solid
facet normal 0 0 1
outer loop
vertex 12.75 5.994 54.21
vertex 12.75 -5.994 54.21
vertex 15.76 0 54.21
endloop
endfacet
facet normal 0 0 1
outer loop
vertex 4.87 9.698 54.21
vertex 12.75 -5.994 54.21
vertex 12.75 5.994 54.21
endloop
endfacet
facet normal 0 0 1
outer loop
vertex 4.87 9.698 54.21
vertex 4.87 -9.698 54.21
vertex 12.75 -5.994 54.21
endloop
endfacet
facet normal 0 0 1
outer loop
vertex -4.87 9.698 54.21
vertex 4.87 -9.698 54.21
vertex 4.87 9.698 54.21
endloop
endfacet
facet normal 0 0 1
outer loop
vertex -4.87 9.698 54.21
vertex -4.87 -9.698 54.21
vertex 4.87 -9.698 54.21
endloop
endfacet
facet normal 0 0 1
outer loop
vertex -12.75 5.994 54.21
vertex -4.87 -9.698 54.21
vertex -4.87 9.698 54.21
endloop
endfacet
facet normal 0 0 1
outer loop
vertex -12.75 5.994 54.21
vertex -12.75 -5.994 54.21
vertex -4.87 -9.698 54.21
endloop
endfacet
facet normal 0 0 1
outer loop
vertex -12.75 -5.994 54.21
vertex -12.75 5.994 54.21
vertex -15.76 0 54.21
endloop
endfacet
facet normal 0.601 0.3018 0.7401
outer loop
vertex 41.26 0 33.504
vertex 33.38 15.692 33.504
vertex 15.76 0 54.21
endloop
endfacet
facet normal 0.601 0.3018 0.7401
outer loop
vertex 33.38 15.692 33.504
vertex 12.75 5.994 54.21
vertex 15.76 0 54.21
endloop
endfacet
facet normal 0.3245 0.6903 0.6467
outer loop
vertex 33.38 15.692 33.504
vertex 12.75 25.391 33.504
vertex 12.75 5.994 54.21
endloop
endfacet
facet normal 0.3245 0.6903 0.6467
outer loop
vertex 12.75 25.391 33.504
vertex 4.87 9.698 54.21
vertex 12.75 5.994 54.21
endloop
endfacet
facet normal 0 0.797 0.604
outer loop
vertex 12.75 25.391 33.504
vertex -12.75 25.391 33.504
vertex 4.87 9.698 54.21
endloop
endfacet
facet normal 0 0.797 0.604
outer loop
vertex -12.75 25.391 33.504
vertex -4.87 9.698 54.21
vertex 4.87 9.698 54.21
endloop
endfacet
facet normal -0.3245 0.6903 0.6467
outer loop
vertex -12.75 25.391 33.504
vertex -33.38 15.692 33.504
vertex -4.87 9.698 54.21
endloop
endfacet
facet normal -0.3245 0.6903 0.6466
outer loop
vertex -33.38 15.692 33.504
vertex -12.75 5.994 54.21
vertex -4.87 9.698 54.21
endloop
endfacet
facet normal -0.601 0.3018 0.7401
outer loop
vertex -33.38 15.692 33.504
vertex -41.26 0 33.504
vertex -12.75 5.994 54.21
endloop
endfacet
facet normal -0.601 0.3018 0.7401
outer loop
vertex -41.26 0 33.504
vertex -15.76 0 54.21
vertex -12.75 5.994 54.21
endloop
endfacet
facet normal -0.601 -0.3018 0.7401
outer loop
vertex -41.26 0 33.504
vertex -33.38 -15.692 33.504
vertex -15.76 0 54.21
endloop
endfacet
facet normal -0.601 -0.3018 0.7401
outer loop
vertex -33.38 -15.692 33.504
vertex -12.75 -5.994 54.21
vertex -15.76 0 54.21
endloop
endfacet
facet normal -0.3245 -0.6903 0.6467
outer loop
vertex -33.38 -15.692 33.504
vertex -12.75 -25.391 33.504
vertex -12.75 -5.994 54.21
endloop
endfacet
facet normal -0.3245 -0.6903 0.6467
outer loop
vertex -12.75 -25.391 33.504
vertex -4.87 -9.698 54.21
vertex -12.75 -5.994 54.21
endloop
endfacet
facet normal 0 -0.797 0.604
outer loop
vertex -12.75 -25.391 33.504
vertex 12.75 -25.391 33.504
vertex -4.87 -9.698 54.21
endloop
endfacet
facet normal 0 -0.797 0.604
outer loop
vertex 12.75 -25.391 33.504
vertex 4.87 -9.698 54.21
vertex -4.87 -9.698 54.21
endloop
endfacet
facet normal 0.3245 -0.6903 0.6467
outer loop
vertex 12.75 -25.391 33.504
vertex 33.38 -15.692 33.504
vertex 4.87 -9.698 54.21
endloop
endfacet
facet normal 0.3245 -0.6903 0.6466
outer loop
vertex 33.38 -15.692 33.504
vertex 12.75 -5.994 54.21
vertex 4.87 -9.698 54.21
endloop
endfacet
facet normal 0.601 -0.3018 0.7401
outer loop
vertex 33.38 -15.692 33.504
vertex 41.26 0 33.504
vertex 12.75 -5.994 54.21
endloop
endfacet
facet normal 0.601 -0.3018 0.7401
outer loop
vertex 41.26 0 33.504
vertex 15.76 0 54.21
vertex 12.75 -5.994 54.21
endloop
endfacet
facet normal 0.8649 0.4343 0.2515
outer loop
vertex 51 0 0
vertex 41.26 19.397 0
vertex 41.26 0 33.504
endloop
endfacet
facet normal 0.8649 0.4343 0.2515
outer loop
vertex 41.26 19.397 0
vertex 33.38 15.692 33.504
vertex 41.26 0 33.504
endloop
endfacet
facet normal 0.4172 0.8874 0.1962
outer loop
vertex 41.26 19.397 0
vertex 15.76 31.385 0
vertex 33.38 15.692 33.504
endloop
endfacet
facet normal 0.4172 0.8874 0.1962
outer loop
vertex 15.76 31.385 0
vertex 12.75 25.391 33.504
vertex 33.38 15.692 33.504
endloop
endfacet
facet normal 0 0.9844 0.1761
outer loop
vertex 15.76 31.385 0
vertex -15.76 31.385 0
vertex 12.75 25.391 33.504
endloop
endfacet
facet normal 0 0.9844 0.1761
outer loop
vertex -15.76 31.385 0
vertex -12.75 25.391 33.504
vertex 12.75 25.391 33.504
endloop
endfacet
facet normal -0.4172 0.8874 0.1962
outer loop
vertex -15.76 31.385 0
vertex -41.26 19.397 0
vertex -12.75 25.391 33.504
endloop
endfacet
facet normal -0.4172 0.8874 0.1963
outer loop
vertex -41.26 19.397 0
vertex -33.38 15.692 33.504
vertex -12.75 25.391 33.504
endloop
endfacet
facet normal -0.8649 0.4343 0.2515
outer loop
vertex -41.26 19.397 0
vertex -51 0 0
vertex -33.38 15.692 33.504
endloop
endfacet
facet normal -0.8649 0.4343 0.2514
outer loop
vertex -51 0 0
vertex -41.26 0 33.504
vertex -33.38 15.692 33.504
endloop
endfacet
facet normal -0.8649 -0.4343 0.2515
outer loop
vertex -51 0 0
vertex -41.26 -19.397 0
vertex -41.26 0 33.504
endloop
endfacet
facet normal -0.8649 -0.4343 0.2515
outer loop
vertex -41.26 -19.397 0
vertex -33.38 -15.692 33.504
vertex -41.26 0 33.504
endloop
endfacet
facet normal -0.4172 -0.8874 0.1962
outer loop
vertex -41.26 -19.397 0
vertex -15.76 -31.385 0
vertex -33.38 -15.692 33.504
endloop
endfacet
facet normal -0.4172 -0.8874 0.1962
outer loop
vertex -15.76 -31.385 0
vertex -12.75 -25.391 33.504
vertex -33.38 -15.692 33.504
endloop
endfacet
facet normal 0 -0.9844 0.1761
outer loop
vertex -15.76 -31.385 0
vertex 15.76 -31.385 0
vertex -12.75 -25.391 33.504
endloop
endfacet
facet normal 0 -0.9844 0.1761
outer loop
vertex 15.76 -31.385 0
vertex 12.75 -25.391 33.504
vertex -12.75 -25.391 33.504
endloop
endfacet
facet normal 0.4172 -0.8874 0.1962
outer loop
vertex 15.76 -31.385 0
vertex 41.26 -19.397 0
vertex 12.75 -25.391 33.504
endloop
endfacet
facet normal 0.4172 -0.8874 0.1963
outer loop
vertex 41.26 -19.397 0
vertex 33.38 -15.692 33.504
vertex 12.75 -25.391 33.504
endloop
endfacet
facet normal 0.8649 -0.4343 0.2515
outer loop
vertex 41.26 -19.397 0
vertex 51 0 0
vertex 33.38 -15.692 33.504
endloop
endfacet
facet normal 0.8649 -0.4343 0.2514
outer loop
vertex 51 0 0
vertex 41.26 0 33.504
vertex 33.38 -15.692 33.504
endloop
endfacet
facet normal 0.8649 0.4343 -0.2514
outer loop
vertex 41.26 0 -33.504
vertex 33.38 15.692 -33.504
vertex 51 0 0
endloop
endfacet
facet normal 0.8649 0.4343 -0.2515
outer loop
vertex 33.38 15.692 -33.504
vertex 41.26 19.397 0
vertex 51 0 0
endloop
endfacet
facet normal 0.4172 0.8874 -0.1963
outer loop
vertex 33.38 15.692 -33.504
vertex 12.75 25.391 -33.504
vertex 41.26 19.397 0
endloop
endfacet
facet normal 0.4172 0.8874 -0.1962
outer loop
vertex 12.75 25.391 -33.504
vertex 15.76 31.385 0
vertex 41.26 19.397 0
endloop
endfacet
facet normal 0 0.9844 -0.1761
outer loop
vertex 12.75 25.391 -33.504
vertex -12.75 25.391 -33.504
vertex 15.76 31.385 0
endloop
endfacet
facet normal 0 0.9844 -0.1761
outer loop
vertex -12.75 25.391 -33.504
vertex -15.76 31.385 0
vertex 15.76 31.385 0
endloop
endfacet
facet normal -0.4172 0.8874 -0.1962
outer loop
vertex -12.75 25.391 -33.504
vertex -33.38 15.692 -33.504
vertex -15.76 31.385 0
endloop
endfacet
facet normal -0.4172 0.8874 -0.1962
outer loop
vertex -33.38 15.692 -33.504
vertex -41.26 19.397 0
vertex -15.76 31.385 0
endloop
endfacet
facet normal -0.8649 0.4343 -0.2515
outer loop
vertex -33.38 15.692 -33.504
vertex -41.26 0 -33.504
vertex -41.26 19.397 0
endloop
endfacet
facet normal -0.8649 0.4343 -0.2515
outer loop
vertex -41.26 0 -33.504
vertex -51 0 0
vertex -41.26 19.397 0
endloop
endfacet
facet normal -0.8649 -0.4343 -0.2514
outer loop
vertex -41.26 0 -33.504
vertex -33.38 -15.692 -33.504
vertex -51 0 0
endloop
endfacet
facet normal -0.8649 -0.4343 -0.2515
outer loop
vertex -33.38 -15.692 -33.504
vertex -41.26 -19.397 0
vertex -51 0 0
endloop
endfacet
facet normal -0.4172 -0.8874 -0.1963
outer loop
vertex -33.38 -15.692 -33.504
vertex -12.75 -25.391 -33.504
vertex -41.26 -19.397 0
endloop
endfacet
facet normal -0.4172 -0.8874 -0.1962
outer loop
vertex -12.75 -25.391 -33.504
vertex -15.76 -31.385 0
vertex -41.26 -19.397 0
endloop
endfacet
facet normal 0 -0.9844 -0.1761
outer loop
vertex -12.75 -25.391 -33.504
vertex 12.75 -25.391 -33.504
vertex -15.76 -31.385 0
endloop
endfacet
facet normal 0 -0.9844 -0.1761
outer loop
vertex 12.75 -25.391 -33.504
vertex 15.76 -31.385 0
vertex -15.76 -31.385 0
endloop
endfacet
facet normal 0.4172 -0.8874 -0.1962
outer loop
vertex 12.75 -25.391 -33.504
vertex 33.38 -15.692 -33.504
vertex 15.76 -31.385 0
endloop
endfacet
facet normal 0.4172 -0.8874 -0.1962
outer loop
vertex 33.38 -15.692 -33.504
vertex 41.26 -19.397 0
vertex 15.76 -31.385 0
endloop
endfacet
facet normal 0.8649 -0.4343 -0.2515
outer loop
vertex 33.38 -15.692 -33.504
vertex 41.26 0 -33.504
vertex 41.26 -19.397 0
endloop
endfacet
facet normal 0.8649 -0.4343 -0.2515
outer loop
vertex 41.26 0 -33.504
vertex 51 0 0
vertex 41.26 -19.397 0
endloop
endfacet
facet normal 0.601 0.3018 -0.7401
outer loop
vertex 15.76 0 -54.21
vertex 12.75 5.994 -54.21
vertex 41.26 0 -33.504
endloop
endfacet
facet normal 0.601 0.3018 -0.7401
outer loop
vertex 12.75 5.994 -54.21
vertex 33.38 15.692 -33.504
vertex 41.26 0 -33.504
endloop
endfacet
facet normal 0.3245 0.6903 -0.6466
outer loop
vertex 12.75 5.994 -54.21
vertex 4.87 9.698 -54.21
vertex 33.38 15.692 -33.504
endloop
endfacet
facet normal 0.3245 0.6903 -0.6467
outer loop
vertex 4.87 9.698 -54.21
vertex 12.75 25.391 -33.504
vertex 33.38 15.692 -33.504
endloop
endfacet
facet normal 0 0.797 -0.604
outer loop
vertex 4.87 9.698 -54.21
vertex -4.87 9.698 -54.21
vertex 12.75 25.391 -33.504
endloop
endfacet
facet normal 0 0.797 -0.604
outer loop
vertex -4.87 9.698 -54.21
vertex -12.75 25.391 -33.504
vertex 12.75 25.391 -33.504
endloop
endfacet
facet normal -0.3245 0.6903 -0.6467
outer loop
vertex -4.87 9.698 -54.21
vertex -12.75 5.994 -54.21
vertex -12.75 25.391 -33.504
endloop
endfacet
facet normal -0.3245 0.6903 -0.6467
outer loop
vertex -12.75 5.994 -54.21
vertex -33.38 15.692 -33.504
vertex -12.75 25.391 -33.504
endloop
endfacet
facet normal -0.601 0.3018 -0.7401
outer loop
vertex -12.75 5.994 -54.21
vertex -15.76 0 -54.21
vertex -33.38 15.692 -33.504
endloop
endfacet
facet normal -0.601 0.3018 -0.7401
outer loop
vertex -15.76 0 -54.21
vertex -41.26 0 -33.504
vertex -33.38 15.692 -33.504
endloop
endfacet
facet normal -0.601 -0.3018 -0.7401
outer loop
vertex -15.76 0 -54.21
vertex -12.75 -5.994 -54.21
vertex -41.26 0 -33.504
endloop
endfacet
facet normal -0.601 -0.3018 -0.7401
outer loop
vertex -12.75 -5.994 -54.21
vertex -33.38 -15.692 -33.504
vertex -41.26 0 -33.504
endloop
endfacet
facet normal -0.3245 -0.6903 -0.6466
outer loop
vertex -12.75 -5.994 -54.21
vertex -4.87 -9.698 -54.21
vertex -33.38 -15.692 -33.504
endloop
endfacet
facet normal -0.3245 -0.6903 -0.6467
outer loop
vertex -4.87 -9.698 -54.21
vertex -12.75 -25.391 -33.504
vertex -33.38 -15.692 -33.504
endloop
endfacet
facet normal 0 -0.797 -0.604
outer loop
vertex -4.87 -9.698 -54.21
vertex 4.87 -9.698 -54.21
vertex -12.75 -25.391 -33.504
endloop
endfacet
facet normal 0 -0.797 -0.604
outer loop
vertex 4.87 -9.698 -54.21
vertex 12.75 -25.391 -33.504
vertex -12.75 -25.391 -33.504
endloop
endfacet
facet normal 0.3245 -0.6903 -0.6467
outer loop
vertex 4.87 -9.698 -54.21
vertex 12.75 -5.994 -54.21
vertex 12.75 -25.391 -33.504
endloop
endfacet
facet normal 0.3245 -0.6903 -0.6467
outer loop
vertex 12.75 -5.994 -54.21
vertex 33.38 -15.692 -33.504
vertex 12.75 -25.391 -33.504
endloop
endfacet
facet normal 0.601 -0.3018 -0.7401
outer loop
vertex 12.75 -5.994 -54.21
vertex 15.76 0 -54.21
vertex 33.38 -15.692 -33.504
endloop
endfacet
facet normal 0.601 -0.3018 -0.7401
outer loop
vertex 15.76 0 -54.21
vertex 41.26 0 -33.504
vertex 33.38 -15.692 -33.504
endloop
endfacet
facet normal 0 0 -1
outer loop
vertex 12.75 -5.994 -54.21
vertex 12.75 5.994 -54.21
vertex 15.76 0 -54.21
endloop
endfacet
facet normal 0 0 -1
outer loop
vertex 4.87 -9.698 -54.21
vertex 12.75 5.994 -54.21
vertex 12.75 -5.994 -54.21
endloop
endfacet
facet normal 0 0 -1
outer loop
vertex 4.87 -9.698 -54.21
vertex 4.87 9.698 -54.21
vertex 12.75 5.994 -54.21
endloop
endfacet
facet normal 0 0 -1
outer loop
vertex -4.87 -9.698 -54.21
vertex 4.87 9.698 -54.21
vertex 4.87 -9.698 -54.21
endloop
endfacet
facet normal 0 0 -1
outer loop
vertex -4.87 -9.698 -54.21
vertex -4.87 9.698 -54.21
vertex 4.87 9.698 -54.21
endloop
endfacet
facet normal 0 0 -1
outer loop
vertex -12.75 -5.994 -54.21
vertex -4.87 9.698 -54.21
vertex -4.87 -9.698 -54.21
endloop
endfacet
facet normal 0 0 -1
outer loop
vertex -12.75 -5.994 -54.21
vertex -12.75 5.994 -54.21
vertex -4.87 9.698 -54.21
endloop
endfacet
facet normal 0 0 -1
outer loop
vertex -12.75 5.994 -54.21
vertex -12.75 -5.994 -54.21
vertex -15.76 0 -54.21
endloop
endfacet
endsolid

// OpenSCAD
// Generated by SolidPython 1.0.1 on 2020-07-29 00:46:53


scale(v = [17, 11, 19]) {
	sphere(r = 3);
}
/***********************************************
*********      SolidPython code:      **********
************************************************
 
# import packages: SolidPython
from solid import *
from solid.utils import *
from itertools import chain, combinations, permutations


class Resize:

    def __init__(self, scad_file):
        self.scad_file = scad_file
        #self.scad_file = import_scad(scad_file)
        # cone/cylinder param:
        self.r1 = 0
        self.r2 = 0
        self.h = 0
        # rectangular prism param:
        self.w = 0
        self.l = 0
        # ellipse param:
        self.r = 0

    # import OpenScad code (file name corresponds to shape)


    # classify shape + parameters
    def assign(self, param1, param2, param3):
        if self.scad_file == 'cone.scad':
            self.r1 = param1
            self.r2 = param2
            self.h = param3
        elif self.scad_file == 'cylinder.scad':
            self.r1 = param1
            self.r2 = param2
            self.h = param3
        elif self.scad_file == 'rectangularPrism.scad':
            self.h = param1
            self.l = param2
            self.w = param3
        else:
            self.r = param1
            self.h = param2

    # resize parameters
    def iterate(self):
        x = range(3, 20, 2)
        i = 1
        if self.scad_file == 'cone.scad':
            tempList = list(permutations(x, 2))
            for temp in tempList:
                param1 = temp[0]
                param2 = temp[1]
                filepath = 'produced_scad_files/' + 'cone' + str(param1) + '_' + str(param2) + '_' + '.scad'
                scad_render_to_file(cylinder(h=param1, r1=param2, r2=0), filepath)

        elif self.scad_file == 'cylinder.scad':
            tempList = list(permutations(x, 3))
            for temp in tempList:
                param1 = temp[0]
                param2 = temp[1]
                filepath = 'produced_scad_files/' + 'cylinder' + str(param1) + '_' + str(param2) + '_' + '.scad'
                scad_render_to_file(cylinder(h=param1, r1=param2, r2=param2), filepath)

        elif self.scad_file == 'rectangularPrism.scad':
            tempList = list(permutations(x, 3))
            for temp in tempList:
                param1 = temp[0]
                param2 = temp[1]
                param3 = temp[2]
                filepath = 'produced_scad_files/' + 'rectangularPrism' + str(param1) + '_' + str(param2) + '_' + str(
                    param3) + '.scad'
                scad_render_to_file(cube(size=(param1, param2, param3)), filepath)

        elif self.scad_file == 'ellipse.scad':
            tempList = list(permutations(x, 4))
            for temp in tempList:
                param1 = temp[0]
                param2 = temp[1]
                param3 = temp[2]
                param4 = temp[3]
                filepath = 'produced_scad_files/' + 'ellipse' + str(param1) + '_' + str(param2) + '_' + str(param3) + '_' + str(param4) + '.scad'
                scad_render_to_file(scale([param1, param2, param3])(sphere(r=param4)), filepath)

    def render_to_scadfile(self):
        scad_render_to_file(scad, 'example.scad') 
 
************************************************/
